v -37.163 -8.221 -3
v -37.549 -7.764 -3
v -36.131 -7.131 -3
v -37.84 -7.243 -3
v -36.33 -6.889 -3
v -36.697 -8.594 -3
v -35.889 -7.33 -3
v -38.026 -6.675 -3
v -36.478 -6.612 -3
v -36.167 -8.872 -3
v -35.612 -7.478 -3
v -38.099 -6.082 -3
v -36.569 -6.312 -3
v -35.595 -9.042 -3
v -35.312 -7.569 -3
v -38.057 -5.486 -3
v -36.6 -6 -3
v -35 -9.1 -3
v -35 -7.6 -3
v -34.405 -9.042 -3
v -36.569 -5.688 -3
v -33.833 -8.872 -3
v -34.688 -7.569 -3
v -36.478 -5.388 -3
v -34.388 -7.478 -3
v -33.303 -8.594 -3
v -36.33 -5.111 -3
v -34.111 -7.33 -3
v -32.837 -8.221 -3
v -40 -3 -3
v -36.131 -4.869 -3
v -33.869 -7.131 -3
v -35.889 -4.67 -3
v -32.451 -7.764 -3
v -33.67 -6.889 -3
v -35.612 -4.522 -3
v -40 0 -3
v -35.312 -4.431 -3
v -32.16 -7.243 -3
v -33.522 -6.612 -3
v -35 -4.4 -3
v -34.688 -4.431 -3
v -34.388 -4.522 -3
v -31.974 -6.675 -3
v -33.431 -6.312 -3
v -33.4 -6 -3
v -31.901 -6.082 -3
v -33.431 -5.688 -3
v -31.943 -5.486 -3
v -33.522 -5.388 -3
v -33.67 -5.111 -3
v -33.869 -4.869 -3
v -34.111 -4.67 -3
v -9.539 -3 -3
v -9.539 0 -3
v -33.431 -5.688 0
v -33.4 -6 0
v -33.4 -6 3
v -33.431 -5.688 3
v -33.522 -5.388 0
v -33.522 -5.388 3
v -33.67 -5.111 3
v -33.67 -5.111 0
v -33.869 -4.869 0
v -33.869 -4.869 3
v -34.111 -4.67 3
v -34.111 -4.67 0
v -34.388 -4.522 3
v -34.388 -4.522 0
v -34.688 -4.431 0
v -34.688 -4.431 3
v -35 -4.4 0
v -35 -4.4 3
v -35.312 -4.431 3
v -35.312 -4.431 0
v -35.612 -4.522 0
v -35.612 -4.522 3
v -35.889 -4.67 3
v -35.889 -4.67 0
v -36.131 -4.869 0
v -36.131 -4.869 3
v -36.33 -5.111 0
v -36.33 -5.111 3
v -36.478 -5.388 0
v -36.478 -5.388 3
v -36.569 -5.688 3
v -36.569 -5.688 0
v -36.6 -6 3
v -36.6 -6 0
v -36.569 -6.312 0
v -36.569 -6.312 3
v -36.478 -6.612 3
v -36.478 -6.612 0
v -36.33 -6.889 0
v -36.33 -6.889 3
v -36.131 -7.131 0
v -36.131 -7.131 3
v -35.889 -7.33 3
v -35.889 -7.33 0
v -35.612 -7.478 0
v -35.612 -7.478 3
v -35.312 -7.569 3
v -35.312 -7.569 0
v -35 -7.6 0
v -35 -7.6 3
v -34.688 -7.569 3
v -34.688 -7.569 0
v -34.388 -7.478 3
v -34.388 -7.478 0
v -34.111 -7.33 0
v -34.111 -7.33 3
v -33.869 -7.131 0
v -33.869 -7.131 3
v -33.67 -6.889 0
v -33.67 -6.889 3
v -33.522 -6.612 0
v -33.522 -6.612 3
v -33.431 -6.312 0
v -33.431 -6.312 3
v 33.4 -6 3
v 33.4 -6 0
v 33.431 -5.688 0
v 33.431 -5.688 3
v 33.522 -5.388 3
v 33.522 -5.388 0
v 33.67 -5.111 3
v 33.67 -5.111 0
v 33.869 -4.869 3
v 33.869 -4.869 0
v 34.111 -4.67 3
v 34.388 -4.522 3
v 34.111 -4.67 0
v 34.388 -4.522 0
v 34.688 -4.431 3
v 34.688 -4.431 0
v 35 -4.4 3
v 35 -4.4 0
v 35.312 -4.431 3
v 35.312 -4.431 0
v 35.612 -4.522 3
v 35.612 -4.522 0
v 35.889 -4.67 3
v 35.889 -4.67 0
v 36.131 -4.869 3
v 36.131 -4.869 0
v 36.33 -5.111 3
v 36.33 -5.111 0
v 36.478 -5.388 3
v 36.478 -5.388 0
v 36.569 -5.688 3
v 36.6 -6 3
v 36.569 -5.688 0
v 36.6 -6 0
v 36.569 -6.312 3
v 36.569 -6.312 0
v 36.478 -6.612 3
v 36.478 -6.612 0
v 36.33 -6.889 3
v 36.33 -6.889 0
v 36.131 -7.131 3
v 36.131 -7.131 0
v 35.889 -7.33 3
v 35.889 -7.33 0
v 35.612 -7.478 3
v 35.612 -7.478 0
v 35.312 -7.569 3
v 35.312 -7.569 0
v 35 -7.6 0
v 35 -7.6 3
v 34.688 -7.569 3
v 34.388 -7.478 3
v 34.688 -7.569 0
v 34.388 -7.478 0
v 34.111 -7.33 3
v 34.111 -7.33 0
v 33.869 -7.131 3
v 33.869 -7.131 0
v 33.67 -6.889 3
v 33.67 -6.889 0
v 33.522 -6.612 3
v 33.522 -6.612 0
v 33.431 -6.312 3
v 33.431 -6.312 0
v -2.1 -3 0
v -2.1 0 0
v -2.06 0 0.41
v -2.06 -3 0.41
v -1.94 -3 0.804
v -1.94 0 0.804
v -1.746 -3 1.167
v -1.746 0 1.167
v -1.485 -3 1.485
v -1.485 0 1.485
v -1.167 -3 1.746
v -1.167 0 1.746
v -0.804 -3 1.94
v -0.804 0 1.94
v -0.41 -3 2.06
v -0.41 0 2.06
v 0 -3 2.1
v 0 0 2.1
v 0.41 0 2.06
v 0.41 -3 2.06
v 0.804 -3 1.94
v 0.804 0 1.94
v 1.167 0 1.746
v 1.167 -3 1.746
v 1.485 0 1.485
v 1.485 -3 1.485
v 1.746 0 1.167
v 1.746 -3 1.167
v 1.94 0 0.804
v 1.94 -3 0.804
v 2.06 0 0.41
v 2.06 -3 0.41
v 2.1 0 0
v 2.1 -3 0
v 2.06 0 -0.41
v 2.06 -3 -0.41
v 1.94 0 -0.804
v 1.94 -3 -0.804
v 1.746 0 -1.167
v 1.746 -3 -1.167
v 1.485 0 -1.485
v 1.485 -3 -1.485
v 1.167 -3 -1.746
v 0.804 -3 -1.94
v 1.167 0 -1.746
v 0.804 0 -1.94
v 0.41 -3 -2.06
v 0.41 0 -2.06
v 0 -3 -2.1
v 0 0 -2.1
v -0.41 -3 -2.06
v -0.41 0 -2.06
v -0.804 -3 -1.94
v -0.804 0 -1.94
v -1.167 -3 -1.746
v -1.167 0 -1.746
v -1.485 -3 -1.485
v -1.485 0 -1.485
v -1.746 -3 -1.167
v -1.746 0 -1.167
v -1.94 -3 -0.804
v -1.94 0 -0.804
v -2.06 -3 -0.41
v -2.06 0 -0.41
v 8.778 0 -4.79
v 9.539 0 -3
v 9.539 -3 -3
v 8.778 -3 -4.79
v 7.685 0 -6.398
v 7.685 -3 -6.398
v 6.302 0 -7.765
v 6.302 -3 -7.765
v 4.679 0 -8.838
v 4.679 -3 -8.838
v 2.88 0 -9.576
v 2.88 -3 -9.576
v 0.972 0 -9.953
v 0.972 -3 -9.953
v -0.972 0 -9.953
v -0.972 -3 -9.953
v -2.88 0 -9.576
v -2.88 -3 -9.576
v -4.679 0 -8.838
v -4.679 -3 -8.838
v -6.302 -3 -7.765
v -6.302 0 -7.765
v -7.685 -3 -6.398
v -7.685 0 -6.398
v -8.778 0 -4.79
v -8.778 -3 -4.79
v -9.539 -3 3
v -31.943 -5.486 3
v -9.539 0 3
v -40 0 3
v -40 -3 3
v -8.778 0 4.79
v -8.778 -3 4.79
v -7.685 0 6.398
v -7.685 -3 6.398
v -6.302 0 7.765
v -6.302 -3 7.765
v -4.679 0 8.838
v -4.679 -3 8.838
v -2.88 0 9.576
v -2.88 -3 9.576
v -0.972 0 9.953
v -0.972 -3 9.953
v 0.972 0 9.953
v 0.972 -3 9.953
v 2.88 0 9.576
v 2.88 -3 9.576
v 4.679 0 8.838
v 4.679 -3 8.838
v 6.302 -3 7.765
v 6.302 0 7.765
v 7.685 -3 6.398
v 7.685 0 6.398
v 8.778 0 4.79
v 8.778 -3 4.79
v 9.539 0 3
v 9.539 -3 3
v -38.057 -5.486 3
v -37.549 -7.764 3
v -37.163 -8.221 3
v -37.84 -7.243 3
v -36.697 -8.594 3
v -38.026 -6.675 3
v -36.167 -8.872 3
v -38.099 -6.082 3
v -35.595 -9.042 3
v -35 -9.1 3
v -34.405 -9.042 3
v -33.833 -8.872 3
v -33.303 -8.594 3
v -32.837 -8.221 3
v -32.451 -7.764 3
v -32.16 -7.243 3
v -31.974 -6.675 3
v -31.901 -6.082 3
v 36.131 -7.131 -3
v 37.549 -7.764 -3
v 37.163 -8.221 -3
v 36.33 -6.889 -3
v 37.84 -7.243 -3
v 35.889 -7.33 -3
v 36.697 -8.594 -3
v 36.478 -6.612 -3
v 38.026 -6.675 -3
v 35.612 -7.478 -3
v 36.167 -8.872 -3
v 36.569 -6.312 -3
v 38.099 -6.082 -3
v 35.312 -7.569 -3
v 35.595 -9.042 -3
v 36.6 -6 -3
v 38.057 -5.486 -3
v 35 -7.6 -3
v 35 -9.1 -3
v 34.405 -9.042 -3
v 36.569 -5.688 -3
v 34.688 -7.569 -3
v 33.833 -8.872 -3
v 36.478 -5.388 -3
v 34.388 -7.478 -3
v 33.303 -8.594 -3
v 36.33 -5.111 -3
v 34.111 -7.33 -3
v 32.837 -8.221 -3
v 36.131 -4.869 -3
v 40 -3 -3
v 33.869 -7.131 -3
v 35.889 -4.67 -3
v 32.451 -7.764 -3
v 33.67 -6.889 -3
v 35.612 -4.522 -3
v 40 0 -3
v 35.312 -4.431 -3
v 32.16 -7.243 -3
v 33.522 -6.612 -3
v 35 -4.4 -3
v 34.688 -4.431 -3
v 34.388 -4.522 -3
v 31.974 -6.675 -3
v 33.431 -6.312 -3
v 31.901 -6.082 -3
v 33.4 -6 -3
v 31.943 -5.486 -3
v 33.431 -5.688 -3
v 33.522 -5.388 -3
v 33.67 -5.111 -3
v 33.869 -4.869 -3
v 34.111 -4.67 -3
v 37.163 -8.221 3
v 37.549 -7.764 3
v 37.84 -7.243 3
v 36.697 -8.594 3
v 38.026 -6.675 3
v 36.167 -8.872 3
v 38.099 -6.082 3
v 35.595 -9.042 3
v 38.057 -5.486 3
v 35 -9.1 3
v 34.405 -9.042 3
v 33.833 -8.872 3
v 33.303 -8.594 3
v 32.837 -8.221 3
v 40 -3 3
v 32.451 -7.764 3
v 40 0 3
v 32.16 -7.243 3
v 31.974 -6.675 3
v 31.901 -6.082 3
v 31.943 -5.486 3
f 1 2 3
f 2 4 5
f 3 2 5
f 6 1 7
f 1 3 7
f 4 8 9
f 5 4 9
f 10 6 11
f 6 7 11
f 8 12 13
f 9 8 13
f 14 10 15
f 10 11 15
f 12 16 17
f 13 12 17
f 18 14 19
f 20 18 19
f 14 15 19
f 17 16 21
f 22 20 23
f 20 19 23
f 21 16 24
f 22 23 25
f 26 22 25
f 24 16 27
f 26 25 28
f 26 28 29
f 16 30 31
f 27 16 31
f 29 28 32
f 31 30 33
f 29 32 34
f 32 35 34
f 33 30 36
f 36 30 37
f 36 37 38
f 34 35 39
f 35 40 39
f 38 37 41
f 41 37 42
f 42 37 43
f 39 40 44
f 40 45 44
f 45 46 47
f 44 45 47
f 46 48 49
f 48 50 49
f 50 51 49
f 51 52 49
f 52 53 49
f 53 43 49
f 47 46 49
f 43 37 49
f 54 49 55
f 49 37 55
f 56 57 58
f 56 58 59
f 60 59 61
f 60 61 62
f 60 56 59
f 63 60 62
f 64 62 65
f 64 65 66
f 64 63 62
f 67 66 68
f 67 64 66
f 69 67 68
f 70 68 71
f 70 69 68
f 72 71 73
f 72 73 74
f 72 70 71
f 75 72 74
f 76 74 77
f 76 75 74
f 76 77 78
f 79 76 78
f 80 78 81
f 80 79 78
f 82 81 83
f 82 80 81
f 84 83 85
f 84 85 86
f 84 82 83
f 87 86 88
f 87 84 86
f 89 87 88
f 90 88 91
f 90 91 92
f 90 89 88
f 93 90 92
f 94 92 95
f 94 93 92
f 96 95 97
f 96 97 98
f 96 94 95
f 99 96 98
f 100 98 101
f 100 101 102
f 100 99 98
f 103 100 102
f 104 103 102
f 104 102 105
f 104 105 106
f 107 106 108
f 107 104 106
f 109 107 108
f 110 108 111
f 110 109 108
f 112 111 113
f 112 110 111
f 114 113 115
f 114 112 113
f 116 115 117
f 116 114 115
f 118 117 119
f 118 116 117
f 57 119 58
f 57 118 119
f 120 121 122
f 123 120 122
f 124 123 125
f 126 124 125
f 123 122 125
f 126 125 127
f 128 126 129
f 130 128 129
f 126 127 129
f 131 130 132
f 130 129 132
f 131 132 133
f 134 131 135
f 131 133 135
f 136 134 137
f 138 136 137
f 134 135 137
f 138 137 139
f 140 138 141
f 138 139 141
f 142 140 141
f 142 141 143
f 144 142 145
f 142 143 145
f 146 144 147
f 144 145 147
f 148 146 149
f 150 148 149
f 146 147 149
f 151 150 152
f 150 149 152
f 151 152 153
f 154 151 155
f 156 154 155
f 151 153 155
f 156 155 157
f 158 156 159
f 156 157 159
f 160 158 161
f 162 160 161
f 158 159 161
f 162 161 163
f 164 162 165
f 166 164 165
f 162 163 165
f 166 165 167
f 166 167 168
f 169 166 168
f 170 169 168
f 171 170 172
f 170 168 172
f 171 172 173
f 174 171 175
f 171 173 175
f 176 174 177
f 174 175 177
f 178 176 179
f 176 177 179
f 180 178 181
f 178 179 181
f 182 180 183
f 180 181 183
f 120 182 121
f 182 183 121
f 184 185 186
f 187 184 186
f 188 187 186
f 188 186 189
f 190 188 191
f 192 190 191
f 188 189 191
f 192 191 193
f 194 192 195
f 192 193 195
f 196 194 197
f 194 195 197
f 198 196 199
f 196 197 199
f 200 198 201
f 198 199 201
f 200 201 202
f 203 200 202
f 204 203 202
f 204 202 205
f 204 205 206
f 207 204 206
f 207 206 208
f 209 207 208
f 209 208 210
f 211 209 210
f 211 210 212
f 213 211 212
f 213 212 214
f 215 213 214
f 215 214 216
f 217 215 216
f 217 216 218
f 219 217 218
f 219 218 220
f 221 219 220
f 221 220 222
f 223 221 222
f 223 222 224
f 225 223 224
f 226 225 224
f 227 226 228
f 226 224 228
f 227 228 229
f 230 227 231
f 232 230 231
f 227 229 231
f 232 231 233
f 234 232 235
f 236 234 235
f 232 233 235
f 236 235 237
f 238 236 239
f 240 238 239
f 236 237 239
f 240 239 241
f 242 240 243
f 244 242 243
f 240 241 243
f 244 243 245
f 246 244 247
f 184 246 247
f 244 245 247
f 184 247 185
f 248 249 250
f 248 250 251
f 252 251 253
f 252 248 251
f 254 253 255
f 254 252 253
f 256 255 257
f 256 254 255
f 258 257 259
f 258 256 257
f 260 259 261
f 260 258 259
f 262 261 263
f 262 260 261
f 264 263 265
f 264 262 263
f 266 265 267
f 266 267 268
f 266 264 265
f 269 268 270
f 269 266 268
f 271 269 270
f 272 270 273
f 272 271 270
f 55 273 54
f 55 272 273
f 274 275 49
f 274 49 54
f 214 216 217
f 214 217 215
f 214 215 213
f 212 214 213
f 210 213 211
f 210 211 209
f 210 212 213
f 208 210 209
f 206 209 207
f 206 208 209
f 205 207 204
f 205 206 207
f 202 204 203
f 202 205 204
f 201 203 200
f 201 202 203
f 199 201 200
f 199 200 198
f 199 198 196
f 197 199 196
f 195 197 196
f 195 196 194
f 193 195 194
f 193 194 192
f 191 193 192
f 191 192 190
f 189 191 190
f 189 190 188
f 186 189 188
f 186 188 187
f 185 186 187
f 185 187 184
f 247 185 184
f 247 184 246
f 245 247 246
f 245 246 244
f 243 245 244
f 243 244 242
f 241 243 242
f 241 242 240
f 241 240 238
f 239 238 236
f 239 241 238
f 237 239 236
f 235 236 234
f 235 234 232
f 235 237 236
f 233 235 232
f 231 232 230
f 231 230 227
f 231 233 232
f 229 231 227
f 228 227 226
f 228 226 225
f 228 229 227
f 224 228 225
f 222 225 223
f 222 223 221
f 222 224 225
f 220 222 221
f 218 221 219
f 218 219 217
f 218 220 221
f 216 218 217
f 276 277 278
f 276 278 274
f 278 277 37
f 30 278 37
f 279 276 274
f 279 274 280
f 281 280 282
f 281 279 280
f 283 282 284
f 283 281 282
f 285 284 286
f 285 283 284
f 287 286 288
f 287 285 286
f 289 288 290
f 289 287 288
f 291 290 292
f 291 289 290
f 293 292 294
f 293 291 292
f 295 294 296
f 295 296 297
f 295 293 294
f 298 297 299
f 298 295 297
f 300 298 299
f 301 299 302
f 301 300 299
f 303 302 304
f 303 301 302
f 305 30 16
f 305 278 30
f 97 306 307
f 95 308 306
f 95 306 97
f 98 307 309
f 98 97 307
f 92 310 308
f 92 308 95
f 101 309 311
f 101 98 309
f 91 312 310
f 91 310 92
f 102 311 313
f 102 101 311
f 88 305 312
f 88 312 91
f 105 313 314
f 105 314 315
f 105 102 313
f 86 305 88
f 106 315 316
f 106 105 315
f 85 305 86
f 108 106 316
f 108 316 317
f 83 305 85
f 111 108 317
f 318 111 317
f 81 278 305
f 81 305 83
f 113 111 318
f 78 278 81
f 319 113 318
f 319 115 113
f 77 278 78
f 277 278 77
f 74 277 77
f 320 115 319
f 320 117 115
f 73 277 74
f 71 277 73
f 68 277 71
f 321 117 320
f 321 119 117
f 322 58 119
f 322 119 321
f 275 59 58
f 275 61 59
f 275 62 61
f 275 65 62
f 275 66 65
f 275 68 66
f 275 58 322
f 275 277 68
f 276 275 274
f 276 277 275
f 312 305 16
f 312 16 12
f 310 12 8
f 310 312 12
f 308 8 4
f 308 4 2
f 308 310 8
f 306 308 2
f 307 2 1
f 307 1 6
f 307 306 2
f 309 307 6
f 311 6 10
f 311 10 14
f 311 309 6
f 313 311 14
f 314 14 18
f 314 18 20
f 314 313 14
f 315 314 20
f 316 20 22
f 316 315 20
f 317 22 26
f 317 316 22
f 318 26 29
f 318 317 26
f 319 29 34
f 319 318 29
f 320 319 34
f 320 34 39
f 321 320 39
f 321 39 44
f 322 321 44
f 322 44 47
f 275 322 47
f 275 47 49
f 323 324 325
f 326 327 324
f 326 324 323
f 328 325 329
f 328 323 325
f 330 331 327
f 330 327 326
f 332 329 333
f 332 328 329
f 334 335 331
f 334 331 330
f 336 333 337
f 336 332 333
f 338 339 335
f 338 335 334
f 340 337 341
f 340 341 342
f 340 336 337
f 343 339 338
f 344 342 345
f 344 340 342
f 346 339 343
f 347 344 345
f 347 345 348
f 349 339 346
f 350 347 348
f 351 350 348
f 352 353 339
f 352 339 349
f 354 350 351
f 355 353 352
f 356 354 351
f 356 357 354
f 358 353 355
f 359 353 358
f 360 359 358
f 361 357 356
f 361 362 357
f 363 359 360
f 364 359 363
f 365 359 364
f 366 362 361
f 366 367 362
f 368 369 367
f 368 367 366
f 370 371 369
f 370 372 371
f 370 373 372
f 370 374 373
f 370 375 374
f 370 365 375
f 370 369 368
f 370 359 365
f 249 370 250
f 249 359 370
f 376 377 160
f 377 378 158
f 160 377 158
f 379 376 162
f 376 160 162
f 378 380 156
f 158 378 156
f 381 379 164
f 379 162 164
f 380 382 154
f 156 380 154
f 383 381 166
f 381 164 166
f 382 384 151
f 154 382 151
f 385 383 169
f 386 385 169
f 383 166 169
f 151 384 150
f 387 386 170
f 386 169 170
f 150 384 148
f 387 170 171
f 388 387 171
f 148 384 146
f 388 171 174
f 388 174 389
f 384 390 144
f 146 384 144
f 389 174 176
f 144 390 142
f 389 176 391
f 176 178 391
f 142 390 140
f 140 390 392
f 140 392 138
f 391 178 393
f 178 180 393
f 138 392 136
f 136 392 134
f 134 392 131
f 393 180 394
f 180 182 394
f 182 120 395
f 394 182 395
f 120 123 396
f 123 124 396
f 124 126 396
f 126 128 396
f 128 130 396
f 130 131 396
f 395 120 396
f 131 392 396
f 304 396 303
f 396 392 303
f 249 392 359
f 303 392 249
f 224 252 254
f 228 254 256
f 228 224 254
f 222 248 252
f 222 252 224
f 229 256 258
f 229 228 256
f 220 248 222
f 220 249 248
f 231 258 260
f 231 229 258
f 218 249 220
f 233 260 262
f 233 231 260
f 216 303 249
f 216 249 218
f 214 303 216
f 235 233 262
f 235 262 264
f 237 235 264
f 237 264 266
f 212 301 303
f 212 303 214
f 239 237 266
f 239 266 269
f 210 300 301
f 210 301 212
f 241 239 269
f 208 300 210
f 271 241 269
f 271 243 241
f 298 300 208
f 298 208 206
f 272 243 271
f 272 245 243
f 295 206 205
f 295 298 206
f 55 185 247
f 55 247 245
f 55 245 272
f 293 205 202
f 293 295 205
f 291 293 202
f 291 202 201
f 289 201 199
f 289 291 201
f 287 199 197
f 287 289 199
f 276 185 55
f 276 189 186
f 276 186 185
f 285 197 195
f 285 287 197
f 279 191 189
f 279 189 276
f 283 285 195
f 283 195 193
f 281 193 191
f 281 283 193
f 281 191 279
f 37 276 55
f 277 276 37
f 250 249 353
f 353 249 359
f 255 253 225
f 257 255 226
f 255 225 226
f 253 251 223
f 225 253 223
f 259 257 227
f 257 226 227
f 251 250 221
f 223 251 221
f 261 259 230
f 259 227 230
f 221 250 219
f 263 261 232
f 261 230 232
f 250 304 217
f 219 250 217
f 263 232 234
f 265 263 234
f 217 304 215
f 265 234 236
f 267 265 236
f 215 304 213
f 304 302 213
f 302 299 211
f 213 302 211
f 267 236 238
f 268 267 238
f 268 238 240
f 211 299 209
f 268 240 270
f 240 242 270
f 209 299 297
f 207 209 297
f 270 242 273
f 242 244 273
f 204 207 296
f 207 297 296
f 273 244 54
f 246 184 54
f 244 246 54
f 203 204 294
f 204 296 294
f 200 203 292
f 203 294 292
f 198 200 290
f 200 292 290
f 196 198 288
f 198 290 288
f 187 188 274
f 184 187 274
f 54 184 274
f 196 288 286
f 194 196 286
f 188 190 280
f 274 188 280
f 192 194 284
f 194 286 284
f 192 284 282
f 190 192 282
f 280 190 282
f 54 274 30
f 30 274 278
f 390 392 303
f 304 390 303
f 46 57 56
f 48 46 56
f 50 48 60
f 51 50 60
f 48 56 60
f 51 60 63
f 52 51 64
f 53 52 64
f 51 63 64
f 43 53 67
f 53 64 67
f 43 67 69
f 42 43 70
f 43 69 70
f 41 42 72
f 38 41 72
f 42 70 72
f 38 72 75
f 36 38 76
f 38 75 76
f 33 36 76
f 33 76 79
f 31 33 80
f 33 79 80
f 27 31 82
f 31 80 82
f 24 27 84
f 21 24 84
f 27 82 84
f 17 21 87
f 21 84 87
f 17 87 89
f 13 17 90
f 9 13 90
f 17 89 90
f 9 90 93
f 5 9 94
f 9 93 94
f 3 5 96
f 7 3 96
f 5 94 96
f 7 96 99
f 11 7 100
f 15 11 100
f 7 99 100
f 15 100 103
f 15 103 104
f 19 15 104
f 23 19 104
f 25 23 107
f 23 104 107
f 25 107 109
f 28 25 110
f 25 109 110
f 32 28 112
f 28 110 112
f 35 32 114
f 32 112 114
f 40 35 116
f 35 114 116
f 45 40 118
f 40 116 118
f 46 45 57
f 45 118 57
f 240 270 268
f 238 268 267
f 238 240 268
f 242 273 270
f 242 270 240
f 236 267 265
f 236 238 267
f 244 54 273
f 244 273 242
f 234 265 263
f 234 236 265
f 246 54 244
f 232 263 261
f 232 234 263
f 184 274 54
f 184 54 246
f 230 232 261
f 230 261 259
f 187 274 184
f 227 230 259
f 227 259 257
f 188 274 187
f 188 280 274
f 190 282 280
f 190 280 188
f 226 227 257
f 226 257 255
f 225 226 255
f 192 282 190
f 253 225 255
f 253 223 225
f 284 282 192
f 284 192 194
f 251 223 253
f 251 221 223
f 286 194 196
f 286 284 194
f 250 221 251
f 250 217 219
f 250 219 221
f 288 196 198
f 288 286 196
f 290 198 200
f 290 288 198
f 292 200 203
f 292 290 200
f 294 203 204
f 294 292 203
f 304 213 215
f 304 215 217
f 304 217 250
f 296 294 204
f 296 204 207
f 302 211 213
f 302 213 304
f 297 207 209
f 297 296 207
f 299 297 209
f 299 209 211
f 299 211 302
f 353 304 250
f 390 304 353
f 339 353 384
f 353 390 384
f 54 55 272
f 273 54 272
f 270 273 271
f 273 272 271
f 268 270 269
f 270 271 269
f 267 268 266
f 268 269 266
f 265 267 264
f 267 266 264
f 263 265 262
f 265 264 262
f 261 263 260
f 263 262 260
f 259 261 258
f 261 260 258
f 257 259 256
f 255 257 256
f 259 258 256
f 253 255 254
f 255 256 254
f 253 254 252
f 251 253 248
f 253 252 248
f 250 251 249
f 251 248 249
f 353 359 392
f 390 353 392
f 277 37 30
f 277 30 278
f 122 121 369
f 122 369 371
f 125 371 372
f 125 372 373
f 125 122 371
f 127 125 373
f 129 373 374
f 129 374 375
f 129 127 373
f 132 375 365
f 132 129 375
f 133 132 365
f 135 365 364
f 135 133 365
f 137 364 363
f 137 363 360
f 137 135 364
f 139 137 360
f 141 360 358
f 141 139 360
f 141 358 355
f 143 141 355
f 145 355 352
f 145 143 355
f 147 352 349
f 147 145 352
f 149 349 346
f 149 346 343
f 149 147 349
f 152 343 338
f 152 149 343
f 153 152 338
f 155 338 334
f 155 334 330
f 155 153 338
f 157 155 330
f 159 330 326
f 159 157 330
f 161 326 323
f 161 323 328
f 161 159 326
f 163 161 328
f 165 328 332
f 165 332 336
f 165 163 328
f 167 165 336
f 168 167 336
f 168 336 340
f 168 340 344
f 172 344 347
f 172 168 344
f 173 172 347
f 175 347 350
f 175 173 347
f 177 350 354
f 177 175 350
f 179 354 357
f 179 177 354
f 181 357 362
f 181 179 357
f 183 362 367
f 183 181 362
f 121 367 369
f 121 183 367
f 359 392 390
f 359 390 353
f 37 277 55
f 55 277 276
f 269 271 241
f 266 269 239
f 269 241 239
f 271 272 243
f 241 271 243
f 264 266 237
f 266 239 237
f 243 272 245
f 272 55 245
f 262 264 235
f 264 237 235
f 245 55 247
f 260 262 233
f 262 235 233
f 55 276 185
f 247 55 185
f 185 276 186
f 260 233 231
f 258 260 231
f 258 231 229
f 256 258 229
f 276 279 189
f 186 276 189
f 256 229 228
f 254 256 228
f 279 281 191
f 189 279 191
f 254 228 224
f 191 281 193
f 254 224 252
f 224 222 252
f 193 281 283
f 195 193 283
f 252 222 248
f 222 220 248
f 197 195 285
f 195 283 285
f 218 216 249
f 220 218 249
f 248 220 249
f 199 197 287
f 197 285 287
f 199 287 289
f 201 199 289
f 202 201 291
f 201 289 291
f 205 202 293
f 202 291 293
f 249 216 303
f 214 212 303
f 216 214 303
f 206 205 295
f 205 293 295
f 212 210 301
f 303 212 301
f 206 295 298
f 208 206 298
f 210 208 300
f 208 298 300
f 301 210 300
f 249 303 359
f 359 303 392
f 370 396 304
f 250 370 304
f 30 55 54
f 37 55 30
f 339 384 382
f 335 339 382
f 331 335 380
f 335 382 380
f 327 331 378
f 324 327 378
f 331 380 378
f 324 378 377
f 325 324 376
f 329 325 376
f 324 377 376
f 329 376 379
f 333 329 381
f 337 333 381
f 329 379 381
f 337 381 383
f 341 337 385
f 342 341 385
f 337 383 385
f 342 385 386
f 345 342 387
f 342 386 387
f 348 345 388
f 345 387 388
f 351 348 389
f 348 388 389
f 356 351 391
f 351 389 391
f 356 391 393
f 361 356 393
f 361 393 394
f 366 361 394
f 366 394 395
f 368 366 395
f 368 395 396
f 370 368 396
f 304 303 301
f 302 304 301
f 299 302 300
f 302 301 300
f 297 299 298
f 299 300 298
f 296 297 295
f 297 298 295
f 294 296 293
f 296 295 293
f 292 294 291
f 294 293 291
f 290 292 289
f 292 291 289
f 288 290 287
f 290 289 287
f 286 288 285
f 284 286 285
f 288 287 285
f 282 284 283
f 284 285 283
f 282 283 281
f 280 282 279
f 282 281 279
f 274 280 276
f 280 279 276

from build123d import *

# Parameters (mm, degrees)
F1_DEPTH      = 3
F3_D          = 4.2
F4_R          = 1.6
F5_DEPTH      = 3
F5_DEPTH_BACK = 3


with BuildPart() as f1:
    # F0 (on Front) → F1 (new body)
    with BuildSketch(Plane.XZ):
        with BuildLine():
            Line((-9.5393920142, 3), (9.5393920142, 3))
            ThreePointArc((9.5393920142, 3), (0, 10), (-9.5393920142, 3))
        make_face()
        with BuildLine():
            ThreePointArc((9.5393920142, -3), (9.8841772582, -1.5175769928), (10, 0))
            ThreePointArc((10, 0), (9.8841772582, 1.5175769928), (9.5393920142, 3))
            Line((9.5393920142, 3), (-9.5393920142, 3))
            ThreePointArc((-9.5393920142, 3), (-10, 0), (-9.5393920142, -3))
            Line((-9.5393920142, -3), (9.5393920142, -3))
        make_face()
        with BuildLine():
            ThreePointArc((9.5393920142, 3), (9.8841772582, 1.5175769928), (10, 0))
            ThreePointArc((10, 0), (9.8841772582, -1.5175769928), (9.5393920142, -3))
            Line((9.5393920142, -3), (40, -3))
            Line((40, -3), (40, 3))
            Line((40, 3), (9.5393920142, 3))
        make_face()
        with BuildLine():
            ThreePointArc((-9.5393920142, -3), (0, -10), (9.5393920142, -3))
            Line((9.5393920142, -3), (-9.5393920142, -3))
        make_face()
        with BuildLine():
            ThreePointArc((-9.5393920142, -3), (-10, 0), (-9.5393920142, 3))
            Line((-9.5393920142, 3), (-40, 3))
            Line((-40, 3), (-40, -3))
            Line((-40, -3), (-9.5393920142, -3))
        make_face()
    extrude(amount=F1_DEPTH)

    # F3 (through all)
    with Locations(Plane.XZ.offset(3)):
        with Locations((0, 0)):
            Hole(F3_D / 2)

    # F4 (on Top) → F5 (join, two sides)
    with BuildSketch(Plane.XY) as f5_sk:
        with BuildLine():
            Line((-40, -3), (-38.0570241789, -5.4856040731))
            ThreePointArc((-38.0570241789, -5.4856040731), (-35, -9.1), (-31.9429758211, -5.4856040731))
            Line((-31.9429758211, -5.4856040731), (-9.5393920142, -3))
            Line((-9.5393920142, -3), (-40, -3))
        make_face()
        with Locations((-35, -6)):
            Circle(F4_R, mode=Mode.SUBTRACT)
    extrude(amount=F5_DEPTH)
    extrude(f5_sk.sketch, amount=-F5_DEPTH_BACK)


with BuildPart() as f6_1:
    # F6: instance of F1
    add(f1.part.mirror(Plane.YZ))


solid = Compound([f1.part, f6_1.part])
